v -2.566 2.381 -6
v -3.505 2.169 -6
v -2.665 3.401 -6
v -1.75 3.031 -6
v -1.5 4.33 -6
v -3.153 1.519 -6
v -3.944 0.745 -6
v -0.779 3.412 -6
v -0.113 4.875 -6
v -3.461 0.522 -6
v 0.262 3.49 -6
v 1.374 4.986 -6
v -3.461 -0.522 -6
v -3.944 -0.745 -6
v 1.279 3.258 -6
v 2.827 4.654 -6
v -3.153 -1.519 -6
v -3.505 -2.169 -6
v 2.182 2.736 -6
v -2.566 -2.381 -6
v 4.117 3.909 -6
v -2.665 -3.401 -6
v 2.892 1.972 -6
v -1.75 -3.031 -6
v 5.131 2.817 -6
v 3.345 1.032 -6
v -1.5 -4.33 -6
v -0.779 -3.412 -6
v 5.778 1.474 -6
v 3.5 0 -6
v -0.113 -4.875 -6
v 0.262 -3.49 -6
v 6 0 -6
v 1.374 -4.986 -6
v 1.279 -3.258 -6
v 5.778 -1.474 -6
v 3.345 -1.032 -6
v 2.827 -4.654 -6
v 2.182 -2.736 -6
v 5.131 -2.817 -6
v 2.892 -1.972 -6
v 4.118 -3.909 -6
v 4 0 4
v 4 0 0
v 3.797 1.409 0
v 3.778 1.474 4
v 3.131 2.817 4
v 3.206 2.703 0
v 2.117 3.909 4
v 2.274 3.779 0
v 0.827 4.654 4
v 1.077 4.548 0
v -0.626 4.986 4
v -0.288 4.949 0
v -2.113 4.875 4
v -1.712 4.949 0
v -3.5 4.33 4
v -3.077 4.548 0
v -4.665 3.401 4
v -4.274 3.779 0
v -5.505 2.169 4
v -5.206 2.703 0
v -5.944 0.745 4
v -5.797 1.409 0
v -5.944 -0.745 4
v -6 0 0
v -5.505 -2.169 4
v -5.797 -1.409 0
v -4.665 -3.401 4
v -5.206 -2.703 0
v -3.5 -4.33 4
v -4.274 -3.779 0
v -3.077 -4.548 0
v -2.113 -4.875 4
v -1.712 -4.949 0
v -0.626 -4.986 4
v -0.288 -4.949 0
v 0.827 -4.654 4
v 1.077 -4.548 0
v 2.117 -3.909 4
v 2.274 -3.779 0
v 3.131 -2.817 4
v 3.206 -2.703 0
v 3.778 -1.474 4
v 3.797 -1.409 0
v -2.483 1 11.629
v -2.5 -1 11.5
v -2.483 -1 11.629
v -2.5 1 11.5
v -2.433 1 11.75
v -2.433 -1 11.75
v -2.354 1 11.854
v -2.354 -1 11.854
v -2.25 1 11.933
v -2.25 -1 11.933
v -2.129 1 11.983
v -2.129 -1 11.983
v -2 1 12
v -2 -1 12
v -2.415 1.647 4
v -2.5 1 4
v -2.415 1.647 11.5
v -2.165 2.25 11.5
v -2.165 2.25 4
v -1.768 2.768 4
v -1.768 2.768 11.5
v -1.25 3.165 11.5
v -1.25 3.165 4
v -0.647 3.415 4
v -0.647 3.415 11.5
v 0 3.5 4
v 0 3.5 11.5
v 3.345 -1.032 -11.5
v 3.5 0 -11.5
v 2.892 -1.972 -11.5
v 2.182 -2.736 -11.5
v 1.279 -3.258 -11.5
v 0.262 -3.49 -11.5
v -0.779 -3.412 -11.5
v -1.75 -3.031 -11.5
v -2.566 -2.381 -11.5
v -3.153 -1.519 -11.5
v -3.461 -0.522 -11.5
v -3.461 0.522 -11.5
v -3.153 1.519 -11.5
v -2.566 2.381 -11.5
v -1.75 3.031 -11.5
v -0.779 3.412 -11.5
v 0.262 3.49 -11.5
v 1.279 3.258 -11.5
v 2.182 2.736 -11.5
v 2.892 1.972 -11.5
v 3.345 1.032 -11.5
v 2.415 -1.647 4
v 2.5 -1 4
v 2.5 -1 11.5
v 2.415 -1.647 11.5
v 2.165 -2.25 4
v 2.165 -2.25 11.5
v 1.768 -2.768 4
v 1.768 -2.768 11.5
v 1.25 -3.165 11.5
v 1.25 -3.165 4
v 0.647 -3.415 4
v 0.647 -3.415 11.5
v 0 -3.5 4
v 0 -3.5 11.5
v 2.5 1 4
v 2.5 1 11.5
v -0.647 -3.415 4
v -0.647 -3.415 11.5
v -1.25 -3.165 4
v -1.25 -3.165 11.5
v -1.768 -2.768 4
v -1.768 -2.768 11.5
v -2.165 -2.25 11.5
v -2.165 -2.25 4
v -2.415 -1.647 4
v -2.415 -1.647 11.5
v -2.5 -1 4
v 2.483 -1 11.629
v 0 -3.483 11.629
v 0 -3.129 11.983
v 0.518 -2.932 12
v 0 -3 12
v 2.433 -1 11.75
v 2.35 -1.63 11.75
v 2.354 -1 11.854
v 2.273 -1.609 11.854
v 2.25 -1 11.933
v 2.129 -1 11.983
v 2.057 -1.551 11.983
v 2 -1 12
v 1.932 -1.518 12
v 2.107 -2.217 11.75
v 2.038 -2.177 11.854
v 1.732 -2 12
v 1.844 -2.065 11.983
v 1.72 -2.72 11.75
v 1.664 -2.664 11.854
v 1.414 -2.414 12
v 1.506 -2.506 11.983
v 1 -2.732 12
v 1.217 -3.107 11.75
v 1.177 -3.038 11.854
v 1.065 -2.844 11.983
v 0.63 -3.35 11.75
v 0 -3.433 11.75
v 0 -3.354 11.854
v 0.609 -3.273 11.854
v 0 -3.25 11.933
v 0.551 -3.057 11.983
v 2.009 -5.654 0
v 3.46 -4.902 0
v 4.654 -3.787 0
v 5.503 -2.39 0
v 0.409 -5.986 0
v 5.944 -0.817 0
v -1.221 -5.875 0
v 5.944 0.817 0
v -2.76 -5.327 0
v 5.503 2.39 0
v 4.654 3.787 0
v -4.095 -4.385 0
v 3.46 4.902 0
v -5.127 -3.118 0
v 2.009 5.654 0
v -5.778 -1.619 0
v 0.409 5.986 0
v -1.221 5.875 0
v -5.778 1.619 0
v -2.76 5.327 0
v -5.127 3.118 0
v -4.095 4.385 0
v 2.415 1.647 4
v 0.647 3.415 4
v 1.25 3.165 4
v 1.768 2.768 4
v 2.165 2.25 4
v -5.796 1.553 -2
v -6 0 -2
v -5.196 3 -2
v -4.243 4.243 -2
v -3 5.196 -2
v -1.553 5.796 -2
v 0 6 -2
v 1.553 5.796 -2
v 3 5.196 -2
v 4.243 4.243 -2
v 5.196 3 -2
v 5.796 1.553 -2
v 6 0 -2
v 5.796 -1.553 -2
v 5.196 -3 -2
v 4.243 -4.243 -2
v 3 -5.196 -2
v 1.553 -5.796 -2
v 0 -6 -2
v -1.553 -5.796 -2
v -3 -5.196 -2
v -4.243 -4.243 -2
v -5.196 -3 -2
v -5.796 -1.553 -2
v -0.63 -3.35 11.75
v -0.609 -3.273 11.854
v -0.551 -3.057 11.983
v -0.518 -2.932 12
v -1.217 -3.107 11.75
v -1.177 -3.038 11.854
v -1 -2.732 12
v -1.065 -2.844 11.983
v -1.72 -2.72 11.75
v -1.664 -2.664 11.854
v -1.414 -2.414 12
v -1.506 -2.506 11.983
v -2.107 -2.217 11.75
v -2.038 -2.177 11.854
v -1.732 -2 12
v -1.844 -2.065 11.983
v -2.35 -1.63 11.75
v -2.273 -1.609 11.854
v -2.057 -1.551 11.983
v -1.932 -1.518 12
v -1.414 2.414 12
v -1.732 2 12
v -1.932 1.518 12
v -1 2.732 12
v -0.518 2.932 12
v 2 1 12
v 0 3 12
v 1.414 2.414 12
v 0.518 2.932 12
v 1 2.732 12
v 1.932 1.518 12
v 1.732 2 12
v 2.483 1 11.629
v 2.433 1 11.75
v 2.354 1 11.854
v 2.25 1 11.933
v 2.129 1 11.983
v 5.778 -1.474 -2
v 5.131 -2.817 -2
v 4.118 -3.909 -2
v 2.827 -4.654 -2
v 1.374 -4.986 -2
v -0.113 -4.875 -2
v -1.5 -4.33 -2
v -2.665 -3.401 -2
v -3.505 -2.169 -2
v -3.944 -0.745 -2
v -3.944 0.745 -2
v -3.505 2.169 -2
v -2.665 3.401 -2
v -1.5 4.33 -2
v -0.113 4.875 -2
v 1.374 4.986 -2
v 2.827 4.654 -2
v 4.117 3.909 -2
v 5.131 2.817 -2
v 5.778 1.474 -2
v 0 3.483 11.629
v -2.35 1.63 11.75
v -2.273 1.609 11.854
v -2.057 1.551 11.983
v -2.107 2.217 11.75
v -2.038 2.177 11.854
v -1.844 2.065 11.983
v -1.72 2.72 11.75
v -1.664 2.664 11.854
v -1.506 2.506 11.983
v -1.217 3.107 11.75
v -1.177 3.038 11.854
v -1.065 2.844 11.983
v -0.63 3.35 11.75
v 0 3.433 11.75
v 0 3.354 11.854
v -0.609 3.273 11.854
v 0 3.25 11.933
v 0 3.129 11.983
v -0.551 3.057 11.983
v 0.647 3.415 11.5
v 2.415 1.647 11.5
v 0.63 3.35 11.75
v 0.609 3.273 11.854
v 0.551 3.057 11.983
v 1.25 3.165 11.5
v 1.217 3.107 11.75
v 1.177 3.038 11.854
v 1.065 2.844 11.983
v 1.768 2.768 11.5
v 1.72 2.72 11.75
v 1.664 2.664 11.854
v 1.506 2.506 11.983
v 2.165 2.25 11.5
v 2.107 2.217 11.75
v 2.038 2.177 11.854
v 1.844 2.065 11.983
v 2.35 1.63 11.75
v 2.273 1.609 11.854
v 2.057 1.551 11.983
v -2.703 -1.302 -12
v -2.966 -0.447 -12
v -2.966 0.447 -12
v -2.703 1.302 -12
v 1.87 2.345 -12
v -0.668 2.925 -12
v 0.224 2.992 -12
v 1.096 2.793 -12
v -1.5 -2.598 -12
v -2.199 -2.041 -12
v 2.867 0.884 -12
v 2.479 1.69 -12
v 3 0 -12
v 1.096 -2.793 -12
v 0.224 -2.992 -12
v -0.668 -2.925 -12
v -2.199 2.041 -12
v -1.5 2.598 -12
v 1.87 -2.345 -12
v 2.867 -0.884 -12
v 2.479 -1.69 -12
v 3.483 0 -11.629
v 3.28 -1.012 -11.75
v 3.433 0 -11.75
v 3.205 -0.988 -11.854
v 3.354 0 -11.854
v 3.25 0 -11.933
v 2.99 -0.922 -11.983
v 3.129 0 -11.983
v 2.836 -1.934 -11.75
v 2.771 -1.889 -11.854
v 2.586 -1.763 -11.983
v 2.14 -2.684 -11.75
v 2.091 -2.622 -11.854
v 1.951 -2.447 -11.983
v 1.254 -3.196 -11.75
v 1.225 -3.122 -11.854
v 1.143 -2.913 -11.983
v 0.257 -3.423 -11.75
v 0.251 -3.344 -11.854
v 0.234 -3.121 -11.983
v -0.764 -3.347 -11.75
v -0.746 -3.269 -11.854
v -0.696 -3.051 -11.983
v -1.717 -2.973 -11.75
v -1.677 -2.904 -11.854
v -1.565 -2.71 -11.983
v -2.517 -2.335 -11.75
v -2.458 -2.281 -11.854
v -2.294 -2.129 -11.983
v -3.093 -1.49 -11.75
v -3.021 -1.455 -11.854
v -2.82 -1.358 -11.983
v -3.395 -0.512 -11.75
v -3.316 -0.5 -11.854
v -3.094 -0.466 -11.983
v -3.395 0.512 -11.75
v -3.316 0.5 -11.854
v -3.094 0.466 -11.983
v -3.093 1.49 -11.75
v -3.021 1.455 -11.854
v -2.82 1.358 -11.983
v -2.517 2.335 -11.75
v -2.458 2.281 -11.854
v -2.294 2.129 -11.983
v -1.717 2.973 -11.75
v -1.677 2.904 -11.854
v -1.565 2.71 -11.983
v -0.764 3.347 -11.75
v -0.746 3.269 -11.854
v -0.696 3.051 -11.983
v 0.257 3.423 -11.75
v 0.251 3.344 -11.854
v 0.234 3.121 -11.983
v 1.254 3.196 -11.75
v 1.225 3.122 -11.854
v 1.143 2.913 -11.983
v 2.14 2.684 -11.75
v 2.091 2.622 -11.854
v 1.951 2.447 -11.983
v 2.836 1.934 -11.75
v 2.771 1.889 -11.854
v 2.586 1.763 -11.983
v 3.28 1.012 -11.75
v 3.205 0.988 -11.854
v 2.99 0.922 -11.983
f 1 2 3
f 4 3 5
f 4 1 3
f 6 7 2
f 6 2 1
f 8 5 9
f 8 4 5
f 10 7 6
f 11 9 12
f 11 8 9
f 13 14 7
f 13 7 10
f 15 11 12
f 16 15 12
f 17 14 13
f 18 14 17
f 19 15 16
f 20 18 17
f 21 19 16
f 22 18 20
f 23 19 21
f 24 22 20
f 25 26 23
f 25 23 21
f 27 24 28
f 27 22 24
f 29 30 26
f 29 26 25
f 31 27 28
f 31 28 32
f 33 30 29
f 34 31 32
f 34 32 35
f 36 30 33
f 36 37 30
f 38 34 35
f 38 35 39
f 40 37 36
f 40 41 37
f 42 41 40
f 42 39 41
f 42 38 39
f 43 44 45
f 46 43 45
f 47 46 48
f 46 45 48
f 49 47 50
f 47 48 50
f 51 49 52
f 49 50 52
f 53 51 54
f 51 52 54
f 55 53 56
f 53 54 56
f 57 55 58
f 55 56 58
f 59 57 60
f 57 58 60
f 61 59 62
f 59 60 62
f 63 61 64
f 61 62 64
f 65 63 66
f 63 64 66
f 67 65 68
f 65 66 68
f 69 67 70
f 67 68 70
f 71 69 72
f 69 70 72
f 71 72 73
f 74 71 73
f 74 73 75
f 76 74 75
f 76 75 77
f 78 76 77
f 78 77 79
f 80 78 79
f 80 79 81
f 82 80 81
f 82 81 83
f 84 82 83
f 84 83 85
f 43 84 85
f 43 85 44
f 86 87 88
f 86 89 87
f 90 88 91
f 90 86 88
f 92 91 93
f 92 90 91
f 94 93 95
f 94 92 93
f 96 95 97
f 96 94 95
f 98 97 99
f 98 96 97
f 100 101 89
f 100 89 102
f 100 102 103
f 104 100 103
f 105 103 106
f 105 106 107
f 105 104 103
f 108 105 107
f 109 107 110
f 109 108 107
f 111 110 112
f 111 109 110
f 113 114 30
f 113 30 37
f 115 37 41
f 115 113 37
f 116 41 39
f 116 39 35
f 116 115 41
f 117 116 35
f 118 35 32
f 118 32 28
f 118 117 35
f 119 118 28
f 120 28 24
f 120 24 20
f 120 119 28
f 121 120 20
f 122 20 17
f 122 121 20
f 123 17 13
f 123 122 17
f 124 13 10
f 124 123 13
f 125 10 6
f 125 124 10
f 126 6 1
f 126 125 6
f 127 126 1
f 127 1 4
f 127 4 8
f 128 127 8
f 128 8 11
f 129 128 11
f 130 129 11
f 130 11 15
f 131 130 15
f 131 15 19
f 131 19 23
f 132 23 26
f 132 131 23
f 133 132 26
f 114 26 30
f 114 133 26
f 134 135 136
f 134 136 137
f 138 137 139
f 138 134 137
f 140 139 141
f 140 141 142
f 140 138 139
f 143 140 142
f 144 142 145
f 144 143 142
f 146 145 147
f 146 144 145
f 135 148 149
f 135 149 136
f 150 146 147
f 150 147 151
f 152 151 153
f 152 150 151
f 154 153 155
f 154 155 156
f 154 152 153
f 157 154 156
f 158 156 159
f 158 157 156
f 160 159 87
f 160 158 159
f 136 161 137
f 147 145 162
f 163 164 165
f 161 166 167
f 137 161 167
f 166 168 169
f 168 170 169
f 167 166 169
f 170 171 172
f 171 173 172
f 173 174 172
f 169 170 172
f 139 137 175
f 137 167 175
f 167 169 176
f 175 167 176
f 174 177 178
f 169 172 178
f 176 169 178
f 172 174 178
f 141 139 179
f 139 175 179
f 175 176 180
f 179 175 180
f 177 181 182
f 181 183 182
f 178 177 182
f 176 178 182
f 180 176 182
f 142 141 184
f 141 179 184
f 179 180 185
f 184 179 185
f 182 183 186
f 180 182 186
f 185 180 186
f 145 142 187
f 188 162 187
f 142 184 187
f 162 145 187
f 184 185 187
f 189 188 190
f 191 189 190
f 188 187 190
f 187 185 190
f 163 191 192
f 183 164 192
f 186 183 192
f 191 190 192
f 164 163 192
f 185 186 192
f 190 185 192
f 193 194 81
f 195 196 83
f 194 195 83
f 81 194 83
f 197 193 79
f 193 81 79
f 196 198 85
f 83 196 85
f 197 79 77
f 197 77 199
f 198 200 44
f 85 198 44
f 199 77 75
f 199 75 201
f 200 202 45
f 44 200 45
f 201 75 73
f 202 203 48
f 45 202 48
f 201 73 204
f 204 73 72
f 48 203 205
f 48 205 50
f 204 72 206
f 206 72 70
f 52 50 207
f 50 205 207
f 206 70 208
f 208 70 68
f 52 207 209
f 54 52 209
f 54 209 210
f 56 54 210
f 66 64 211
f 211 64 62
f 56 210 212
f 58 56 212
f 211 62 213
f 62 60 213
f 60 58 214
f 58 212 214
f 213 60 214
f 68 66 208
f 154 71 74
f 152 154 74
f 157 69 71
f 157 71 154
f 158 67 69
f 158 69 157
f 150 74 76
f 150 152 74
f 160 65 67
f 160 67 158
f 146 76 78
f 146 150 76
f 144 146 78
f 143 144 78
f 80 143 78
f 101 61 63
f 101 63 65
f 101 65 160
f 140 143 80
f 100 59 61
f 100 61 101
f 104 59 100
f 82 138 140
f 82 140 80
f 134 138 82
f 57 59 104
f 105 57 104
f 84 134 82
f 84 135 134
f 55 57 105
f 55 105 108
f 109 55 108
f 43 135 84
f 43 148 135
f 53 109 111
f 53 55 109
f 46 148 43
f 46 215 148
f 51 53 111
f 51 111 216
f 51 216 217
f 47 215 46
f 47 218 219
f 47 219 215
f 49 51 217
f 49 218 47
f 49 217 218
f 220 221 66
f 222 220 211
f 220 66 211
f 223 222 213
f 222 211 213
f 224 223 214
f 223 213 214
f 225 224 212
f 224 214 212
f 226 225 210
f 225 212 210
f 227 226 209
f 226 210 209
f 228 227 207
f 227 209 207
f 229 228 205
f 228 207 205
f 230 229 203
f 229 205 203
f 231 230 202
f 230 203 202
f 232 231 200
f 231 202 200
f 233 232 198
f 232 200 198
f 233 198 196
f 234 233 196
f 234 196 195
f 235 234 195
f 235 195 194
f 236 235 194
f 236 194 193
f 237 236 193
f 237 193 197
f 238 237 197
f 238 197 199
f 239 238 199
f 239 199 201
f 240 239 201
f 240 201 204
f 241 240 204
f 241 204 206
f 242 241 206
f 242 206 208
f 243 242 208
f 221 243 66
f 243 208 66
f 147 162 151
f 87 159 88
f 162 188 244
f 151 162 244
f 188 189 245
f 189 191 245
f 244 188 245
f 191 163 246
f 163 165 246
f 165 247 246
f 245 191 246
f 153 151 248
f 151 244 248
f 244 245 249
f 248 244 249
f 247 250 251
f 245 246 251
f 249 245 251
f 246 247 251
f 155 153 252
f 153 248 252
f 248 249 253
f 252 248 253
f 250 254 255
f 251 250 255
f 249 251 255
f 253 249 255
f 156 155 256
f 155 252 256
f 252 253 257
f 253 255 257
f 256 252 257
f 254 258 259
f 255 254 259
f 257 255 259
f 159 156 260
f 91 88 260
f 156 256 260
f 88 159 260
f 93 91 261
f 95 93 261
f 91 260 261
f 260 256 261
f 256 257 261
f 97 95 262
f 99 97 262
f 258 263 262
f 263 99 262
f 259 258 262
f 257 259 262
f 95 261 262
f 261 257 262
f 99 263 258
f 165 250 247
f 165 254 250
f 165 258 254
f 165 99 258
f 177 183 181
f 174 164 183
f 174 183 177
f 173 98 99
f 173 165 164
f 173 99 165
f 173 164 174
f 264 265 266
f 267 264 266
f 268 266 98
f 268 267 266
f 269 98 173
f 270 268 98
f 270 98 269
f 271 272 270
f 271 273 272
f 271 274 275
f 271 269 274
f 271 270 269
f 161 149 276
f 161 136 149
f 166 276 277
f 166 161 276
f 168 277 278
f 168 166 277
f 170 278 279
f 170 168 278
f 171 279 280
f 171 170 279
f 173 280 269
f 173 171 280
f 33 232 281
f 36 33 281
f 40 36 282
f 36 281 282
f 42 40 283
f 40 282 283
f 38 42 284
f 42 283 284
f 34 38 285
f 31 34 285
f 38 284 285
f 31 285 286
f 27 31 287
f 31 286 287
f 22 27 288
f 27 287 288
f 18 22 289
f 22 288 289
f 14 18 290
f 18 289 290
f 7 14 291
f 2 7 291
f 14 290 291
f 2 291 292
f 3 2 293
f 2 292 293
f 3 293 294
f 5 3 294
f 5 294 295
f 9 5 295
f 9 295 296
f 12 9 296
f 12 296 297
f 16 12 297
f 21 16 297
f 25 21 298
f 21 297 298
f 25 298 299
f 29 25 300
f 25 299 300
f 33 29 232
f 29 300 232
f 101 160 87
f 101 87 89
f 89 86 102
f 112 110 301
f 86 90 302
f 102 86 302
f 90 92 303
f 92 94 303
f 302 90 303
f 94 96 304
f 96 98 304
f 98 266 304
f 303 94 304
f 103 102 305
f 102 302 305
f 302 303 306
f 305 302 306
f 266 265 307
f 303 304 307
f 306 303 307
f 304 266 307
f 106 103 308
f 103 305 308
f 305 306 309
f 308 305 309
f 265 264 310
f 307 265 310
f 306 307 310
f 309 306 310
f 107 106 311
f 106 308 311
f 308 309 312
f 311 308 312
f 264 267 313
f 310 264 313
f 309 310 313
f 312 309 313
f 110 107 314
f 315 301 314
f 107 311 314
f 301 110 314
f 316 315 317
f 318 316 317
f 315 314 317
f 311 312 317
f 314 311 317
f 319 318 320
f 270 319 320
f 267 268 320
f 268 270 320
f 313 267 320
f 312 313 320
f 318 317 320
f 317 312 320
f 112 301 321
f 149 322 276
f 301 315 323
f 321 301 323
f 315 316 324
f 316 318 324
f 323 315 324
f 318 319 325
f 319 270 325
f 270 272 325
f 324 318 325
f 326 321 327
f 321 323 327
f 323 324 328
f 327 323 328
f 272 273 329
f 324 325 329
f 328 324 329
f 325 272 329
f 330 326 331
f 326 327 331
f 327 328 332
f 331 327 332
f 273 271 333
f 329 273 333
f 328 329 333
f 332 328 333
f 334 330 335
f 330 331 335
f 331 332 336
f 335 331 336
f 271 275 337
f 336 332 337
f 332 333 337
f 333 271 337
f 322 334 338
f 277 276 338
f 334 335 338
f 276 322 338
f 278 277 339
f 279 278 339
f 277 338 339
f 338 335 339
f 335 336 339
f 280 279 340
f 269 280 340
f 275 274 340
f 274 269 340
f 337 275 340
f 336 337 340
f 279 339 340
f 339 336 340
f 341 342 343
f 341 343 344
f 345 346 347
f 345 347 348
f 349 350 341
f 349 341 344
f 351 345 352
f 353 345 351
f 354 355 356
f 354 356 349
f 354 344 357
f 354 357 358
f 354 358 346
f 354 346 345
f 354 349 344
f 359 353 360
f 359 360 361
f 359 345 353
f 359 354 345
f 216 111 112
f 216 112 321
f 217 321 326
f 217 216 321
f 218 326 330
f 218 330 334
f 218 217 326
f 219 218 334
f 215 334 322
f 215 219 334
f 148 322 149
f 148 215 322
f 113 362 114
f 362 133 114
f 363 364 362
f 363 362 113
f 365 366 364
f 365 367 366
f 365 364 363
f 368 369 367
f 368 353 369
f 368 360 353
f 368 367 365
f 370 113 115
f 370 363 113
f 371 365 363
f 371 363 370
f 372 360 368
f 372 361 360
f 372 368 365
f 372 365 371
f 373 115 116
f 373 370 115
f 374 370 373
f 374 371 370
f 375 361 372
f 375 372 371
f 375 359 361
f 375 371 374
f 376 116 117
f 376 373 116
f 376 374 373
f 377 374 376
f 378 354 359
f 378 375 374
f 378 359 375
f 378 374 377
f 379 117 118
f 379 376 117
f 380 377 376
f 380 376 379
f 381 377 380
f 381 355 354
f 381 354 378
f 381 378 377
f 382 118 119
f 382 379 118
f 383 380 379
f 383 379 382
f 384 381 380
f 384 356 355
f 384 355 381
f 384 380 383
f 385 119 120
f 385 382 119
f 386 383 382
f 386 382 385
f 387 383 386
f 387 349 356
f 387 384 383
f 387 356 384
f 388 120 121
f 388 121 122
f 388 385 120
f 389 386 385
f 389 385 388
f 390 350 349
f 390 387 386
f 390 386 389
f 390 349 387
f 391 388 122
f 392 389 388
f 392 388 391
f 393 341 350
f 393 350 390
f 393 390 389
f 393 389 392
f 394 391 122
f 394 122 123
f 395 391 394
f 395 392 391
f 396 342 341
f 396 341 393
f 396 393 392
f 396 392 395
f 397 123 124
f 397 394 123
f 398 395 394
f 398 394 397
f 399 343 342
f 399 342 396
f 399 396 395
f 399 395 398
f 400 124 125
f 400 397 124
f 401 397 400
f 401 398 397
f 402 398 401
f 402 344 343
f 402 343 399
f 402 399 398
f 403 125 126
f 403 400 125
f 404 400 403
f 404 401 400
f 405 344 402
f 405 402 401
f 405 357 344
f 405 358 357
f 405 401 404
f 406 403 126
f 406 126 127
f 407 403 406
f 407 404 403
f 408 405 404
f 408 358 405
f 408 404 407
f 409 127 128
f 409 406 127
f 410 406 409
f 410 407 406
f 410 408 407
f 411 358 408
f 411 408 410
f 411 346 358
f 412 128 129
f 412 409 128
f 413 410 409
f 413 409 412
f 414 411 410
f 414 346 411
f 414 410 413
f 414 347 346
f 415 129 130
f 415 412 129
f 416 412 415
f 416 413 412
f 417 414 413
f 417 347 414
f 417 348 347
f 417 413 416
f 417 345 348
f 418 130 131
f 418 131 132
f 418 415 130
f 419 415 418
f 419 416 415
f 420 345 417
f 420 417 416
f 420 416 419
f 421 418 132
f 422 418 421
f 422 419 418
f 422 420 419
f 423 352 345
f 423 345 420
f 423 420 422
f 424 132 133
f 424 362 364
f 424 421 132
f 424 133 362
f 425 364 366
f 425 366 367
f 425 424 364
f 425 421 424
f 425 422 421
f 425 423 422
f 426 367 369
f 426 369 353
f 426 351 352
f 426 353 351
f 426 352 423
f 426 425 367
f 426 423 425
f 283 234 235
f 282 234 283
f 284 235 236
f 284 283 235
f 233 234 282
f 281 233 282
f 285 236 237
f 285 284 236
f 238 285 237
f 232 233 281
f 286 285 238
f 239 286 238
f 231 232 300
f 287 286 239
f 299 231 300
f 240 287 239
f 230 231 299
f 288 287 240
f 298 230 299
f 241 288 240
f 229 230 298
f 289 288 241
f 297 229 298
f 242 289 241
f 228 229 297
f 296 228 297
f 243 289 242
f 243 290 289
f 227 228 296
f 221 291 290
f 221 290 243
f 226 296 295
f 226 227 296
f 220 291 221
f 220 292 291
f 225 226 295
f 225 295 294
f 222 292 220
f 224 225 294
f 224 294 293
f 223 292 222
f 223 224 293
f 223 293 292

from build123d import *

# Parameters (mm, degrees)
SKETCH_1_R          = 5
EXTRUDE_1_DEPTH     = 4
SKETCH_2_R          = 6
EXTRUDE_2_DEPTH     = 2
SKETCH_3_R          = 5
EXTRUDE_3_DEPTH     = 4
SKETCH_4_R          = 3.5
EXTRUDE_4_DEPTH     = 8
EXTRUDE_START       = 6
SKETCH_5_R          = 3.5
EXTRUDE_5_DEPTH     = 6
CUT_EXTRUDE_START   = -8
CUT_EXTRUDE_2_DEPTH = 8
FILLET_1_R          = 0.5


with BuildPart() as part:
    # 草图1 → 凸台-拉伸1 (new body)
    with BuildSketch(Plane.XY):
        with Locations((-1, 0)):
            Circle(SKETCH_1_R)
    extrude(amount=EXTRUDE_1_DEPTH)

    # 草图2 → 凸台-拉伸2 (add)
    with BuildSketch(Plane(origin=(0, 0, 0), x_dir=(-1, 0, 0), z_dir=(0, 0, -1))):
        Circle(SKETCH_2_R)
    extrude(amount=EXTRUDE_2_DEPTH)

    # 草图3 → 凸台-拉伸3 (add)
    with BuildSketch(Plane(origin=(0, 0, -2), x_dir=(-1, 0, 0), z_dir=(0, 0, -1))):
        with Locations(Location((-1, 0, 0), (0, 0, 179.999112378))):
            Circle(SKETCH_3_R)
    extrude(amount=EXTRUDE_3_DEPTH)

    # 草图4 → 凸台-拉伸4 (add)
    with BuildSketch(Plane.XY.offset(4)):
        Circle(SKETCH_4_R)
    extrude(amount=EXTRUDE_4_DEPTH)

    # 草图5 → 凸台-拉伸5 (add)
    with BuildSketch(Plane(origin=(0, 0, -6), x_dir=(-1, 0, 0), z_dir=(0, 0, -1)).offset(EXTRUDE_START)):
        with Locations(Location((0, 0, 0), (0, 0, 180))):
            Circle(SKETCH_5_R)
    extrude(amount=-EXTRUDE_5_DEPTH)

    # 草图7 → 切除-拉伸2 (cut)
    with BuildSketch(Plane.XY.offset(12).offset(CUT_EXTRUDE_START)):
        with BuildLine():
            ThreePointArc((2.5, -1), (1.767766953, -2.767766953), (0, -3.5))
            ThreePointArc((0, -3.5), (2.474873734, -2.474873734), (3.5, 0))
            ThreePointArc((3.5, 0), (2.47487374, 2.474873729), (1.6e-08, 3.5))
            ThreePointArc((1.6e-08, 3.5), (1.767766959, 2.767766947), (2.5, 1))
            Line((2.5, 1), (2.5, -1))
        make_face()
        with BuildLine():
            ThreePointArc((0, -3.5), (-1.767766953, -2.767766953), (-2.5, -1))
            Line((-2.5, -1), (-2.5, 1))
            ThreePointArc((-2.5, 1), (-1.767766947, 2.767766959), (1.6e-08, 3.5))
            ThreePointArc((1.6e-08, 3.5), (-3.5, 8e-09), (0, -3.5))
        make_face()
    extrude(amount=CUT_EXTRUDE_2_DEPTH, mode=Mode.SUBTRACT)

    # 圆角1
    fillet_1_edges = [part.edges().sort_by_distance(p)[0] for p in [
        (-3.5, 0, -12),
        (0, 3.5, 12),
        (0, -3.5, 12),
        (2.5, 0, 12),
        (-2.5, 0, 12),
    ]]
    fillet(fillet_1_edges, radius=FILLET_1_R)


solid = part.part
